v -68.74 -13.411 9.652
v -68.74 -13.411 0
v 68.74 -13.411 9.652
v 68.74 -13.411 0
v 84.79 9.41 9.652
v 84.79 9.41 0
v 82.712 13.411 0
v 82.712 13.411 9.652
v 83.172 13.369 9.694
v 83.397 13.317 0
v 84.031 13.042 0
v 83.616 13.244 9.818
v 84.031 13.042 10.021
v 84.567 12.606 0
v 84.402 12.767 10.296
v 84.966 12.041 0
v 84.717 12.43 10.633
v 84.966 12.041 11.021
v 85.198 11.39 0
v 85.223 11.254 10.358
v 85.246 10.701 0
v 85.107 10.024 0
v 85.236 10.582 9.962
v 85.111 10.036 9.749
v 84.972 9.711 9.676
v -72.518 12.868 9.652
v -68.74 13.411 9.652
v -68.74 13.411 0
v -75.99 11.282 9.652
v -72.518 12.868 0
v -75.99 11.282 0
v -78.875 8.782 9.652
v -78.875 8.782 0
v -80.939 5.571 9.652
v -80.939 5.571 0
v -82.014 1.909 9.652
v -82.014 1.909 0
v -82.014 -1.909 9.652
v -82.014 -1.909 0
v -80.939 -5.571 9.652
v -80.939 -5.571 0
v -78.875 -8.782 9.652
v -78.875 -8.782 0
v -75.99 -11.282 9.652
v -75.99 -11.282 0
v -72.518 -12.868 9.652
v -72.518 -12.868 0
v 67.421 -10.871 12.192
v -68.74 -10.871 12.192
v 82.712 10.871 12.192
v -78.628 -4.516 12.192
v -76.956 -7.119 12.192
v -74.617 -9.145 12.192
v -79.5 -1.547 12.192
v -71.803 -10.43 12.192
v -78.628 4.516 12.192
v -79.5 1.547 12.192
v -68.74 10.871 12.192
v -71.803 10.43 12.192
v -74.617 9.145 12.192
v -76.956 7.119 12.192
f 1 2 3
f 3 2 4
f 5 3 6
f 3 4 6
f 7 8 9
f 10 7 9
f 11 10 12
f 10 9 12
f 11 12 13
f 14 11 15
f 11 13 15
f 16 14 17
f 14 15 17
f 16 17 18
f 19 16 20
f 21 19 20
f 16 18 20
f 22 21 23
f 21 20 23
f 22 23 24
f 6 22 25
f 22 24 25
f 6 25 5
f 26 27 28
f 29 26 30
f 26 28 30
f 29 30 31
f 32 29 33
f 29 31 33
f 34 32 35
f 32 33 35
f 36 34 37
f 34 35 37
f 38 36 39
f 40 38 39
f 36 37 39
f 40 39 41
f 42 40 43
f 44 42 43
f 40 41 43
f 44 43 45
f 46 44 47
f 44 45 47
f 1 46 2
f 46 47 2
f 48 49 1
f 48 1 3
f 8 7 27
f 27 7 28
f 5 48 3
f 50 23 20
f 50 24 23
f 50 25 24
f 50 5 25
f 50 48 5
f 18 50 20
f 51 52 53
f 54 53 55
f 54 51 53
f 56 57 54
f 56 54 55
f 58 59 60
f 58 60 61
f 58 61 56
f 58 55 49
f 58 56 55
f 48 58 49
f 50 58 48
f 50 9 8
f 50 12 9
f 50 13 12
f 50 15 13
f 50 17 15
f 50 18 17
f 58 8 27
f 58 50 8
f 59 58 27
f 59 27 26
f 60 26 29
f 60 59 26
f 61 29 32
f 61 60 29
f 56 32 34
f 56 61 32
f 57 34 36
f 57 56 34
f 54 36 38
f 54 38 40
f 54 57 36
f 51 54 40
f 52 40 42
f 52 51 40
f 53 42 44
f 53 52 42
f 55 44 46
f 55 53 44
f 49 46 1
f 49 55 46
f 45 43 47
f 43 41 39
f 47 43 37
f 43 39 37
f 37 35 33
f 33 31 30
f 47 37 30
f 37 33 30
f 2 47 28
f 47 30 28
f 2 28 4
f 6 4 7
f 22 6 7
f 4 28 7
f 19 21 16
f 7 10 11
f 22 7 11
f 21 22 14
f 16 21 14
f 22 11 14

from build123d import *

# Parameters (mm, degrees)
F0_W     = 137.48005
F0_H     = 26.821588
F1_DEPTH = 12.192
F2_SIZE  = 2.54
F3_R     = 2.54


with BuildPart() as f1:
    # F0 (on Top) → F1 (new body)
    with BuildSketch(Plane.XY):
        with BuildLine():
            Line((-68.740025, -13.410794), (-68.740025, 13.410794))
            ThreePointArc((-68.740025, 13.410794), (-82.150819, 0), (-68.740025, -13.410794))
        make_face()
        Rectangle(F0_W, F0_H)
        Polygon((87.603755, 13.410794), (68.740025, 13.410794), (68.740025, -13.410794), align=None)
    extrude(amount=F1_DEPTH)

    # F2
    f2_edges = [f1.edges().sort_by_distance(p)[0] for p in [
        (9.431865, 13.410794, 12.192),
        (-82.150819, 0, 12.192),
        (0, -13.410794, 12.192),
        (78.17189, 0, 12.192),
    ]]
    chamfer(f2_edges, length=F2_SIZE)

    # F3
    f3_edges = [f1.edges().sort_by_distance(p)[0] for p in [
        (87.603755, 13.410794, 4.826),
    ]]
    fillet(f3_edges, radius=F3_R)


solid = f1.part
